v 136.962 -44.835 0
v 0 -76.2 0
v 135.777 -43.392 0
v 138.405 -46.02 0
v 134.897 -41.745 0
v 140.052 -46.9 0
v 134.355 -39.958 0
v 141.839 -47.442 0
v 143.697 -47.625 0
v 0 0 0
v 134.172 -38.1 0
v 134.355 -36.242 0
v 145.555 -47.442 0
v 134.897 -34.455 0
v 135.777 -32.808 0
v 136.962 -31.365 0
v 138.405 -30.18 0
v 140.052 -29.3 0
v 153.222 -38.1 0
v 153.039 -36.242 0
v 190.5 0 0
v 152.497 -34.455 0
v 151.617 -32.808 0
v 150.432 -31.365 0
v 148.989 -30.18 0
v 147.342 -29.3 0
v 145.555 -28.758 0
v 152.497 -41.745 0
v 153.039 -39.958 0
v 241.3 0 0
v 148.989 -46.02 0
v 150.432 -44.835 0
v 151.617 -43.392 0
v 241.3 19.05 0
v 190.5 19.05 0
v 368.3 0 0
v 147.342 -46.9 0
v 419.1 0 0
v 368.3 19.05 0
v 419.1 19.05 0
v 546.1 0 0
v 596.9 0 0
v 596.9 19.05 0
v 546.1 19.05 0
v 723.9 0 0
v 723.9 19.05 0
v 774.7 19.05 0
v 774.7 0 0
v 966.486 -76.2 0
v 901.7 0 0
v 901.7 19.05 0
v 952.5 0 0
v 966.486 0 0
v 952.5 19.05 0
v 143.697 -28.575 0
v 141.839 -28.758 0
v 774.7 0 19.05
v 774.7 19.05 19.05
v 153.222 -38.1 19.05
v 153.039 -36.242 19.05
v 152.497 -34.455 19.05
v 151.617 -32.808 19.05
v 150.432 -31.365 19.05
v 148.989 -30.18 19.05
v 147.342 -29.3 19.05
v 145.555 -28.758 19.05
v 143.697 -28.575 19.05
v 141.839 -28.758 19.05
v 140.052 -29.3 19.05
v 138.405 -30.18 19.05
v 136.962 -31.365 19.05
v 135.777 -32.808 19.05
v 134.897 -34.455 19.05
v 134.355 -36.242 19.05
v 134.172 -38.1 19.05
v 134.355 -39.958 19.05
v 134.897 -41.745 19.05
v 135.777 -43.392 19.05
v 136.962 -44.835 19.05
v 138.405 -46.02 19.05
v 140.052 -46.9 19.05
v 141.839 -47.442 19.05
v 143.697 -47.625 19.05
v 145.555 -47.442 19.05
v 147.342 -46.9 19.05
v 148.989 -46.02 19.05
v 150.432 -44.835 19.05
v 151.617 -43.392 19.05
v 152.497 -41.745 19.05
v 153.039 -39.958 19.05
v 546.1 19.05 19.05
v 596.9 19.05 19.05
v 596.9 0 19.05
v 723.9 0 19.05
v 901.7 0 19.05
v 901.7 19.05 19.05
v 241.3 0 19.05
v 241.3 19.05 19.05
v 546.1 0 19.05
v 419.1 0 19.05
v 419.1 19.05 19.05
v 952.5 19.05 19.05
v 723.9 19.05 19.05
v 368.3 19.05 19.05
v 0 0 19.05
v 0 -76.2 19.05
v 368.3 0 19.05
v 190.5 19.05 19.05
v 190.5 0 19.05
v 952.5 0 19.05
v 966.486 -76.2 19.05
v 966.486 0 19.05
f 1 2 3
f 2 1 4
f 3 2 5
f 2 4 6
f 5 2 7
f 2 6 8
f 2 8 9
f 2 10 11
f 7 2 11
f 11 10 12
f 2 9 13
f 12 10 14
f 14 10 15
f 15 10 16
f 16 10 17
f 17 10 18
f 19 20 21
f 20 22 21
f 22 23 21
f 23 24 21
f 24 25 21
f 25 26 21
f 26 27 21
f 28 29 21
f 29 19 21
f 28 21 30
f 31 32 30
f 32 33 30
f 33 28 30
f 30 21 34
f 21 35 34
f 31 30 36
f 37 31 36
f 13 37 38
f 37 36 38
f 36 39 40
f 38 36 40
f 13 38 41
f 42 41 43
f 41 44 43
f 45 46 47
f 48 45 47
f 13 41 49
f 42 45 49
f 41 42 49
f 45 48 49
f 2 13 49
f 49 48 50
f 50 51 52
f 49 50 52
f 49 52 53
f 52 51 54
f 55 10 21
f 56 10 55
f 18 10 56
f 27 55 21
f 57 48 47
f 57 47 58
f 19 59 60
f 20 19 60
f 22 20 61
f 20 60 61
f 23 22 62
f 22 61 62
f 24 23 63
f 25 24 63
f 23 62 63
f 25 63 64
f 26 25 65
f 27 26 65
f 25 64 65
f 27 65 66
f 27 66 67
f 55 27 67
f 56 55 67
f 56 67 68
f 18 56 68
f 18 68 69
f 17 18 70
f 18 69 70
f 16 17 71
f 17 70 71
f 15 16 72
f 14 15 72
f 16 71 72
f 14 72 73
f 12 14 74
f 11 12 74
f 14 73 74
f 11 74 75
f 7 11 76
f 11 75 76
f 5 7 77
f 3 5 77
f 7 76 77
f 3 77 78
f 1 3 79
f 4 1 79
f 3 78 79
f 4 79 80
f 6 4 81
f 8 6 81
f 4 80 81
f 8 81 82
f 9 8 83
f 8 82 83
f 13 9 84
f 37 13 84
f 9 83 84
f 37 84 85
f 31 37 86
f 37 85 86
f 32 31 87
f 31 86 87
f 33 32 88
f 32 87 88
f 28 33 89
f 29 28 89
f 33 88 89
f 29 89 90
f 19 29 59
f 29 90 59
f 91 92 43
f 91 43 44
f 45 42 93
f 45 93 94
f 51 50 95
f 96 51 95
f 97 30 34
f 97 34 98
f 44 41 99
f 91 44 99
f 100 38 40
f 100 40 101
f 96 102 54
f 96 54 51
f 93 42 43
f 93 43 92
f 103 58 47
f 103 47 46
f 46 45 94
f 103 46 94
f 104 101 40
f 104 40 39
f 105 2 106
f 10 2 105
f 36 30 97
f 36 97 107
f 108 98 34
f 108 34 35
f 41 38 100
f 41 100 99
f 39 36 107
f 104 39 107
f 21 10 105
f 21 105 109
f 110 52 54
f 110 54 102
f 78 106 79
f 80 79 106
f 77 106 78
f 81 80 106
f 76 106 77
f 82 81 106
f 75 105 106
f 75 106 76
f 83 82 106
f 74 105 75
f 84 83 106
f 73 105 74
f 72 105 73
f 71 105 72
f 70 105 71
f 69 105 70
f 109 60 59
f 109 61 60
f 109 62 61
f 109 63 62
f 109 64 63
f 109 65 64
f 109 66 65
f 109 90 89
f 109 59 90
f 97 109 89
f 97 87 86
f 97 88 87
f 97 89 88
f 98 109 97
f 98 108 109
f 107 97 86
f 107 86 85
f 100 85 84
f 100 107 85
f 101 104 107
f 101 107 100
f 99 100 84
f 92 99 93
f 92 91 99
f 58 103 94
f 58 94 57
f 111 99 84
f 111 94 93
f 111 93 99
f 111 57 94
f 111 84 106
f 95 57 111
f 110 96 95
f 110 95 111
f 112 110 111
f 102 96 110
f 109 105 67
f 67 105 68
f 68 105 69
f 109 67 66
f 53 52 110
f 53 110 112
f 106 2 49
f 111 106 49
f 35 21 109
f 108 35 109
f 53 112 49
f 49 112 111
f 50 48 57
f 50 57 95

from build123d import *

# Parameters (mm, degrees)
F0_W     = 1143
F0_H     = 76.2
F1_DEPTH = 19.05
F2_W     = 50.8
F2_H     = 19.05
F3_DEPTH = 19.05
F4_R     = 9.525
F5_DEPTH = 19.05
F6_W     = 22.86
F6_H     = 15.875
F7_DEPTH = 25.4
F9_DEPTH = 25.4


# Not quite as in the source:
# - a length typed as a fraction of an inch, garbled in the dataset ("3 / 203.2 mm" for 3/8 in), is restored
# - a feature names something its author has since deleted; it is built from what else it names


with BuildPart() as f1:
    # F0 (on Top) → F1 (new body)
    with BuildSketch(Plane.XY):
        with Locations((571.5, -38.1)):
            Rectangle(F0_W, F0_H)
    extrude(amount=F1_DEPTH)

    # F2 (on face) → F3 (join)
    with BuildSketch(Plane(origin=(0, 0, 0), x_dir=(-1, 0, 0), z_dir=(0, 1, 0))):
        with Locations((-927.1, 9.525)):
            Rectangle(F2_W, F2_H)
        with Locations((-749.3, 9.525)):
            Rectangle(F2_W, F2_H)
        with Locations((-571.5, 9.525)):
            Rectangle(F2_W, F2_H)
        with Locations((-393.7, 9.525)):
            Rectangle(F2_W, F2_H)
        with Locations((-215.9, 9.525)):
            Rectangle(F2_W, F2_H)
    extrude(amount=F3_DEPTH)

    # F4 (on face) → F5 (cut)
    with BuildSketch(Plane.XY.offset(19.05)):
        with Locations((143.6968424, -38.1)):
            Circle(F4_R)
    extrude(amount=-F5_DEPTH, mode=Mode.SUBTRACT)

    # F6 (on face) → F7 (cut)
    with BuildSketch(Plane.XY.offset(19.05)):
        with Locations((1047.75, -7.9375)):
            Rectangle(F6_W, F6_H)
    extrude(amount=-F7_DEPTH, mode=Mode.SUBTRACT)

    # F8 (on face) → F9 (cut)
    with BuildSketch(Plane.XY.offset(19.05)):
        Polygon((1036.32, 0), (966.4863944054, 0), (966.4863944054, -76.2), (1143, -76.2), (1143, 0), (1059.18, 0), (1059.18, -15.875), (1036.32, -15.875), align=None)
    extrude(amount=-F9_DEPTH, mode=Mode.SUBTRACT)


solid = f1.part
